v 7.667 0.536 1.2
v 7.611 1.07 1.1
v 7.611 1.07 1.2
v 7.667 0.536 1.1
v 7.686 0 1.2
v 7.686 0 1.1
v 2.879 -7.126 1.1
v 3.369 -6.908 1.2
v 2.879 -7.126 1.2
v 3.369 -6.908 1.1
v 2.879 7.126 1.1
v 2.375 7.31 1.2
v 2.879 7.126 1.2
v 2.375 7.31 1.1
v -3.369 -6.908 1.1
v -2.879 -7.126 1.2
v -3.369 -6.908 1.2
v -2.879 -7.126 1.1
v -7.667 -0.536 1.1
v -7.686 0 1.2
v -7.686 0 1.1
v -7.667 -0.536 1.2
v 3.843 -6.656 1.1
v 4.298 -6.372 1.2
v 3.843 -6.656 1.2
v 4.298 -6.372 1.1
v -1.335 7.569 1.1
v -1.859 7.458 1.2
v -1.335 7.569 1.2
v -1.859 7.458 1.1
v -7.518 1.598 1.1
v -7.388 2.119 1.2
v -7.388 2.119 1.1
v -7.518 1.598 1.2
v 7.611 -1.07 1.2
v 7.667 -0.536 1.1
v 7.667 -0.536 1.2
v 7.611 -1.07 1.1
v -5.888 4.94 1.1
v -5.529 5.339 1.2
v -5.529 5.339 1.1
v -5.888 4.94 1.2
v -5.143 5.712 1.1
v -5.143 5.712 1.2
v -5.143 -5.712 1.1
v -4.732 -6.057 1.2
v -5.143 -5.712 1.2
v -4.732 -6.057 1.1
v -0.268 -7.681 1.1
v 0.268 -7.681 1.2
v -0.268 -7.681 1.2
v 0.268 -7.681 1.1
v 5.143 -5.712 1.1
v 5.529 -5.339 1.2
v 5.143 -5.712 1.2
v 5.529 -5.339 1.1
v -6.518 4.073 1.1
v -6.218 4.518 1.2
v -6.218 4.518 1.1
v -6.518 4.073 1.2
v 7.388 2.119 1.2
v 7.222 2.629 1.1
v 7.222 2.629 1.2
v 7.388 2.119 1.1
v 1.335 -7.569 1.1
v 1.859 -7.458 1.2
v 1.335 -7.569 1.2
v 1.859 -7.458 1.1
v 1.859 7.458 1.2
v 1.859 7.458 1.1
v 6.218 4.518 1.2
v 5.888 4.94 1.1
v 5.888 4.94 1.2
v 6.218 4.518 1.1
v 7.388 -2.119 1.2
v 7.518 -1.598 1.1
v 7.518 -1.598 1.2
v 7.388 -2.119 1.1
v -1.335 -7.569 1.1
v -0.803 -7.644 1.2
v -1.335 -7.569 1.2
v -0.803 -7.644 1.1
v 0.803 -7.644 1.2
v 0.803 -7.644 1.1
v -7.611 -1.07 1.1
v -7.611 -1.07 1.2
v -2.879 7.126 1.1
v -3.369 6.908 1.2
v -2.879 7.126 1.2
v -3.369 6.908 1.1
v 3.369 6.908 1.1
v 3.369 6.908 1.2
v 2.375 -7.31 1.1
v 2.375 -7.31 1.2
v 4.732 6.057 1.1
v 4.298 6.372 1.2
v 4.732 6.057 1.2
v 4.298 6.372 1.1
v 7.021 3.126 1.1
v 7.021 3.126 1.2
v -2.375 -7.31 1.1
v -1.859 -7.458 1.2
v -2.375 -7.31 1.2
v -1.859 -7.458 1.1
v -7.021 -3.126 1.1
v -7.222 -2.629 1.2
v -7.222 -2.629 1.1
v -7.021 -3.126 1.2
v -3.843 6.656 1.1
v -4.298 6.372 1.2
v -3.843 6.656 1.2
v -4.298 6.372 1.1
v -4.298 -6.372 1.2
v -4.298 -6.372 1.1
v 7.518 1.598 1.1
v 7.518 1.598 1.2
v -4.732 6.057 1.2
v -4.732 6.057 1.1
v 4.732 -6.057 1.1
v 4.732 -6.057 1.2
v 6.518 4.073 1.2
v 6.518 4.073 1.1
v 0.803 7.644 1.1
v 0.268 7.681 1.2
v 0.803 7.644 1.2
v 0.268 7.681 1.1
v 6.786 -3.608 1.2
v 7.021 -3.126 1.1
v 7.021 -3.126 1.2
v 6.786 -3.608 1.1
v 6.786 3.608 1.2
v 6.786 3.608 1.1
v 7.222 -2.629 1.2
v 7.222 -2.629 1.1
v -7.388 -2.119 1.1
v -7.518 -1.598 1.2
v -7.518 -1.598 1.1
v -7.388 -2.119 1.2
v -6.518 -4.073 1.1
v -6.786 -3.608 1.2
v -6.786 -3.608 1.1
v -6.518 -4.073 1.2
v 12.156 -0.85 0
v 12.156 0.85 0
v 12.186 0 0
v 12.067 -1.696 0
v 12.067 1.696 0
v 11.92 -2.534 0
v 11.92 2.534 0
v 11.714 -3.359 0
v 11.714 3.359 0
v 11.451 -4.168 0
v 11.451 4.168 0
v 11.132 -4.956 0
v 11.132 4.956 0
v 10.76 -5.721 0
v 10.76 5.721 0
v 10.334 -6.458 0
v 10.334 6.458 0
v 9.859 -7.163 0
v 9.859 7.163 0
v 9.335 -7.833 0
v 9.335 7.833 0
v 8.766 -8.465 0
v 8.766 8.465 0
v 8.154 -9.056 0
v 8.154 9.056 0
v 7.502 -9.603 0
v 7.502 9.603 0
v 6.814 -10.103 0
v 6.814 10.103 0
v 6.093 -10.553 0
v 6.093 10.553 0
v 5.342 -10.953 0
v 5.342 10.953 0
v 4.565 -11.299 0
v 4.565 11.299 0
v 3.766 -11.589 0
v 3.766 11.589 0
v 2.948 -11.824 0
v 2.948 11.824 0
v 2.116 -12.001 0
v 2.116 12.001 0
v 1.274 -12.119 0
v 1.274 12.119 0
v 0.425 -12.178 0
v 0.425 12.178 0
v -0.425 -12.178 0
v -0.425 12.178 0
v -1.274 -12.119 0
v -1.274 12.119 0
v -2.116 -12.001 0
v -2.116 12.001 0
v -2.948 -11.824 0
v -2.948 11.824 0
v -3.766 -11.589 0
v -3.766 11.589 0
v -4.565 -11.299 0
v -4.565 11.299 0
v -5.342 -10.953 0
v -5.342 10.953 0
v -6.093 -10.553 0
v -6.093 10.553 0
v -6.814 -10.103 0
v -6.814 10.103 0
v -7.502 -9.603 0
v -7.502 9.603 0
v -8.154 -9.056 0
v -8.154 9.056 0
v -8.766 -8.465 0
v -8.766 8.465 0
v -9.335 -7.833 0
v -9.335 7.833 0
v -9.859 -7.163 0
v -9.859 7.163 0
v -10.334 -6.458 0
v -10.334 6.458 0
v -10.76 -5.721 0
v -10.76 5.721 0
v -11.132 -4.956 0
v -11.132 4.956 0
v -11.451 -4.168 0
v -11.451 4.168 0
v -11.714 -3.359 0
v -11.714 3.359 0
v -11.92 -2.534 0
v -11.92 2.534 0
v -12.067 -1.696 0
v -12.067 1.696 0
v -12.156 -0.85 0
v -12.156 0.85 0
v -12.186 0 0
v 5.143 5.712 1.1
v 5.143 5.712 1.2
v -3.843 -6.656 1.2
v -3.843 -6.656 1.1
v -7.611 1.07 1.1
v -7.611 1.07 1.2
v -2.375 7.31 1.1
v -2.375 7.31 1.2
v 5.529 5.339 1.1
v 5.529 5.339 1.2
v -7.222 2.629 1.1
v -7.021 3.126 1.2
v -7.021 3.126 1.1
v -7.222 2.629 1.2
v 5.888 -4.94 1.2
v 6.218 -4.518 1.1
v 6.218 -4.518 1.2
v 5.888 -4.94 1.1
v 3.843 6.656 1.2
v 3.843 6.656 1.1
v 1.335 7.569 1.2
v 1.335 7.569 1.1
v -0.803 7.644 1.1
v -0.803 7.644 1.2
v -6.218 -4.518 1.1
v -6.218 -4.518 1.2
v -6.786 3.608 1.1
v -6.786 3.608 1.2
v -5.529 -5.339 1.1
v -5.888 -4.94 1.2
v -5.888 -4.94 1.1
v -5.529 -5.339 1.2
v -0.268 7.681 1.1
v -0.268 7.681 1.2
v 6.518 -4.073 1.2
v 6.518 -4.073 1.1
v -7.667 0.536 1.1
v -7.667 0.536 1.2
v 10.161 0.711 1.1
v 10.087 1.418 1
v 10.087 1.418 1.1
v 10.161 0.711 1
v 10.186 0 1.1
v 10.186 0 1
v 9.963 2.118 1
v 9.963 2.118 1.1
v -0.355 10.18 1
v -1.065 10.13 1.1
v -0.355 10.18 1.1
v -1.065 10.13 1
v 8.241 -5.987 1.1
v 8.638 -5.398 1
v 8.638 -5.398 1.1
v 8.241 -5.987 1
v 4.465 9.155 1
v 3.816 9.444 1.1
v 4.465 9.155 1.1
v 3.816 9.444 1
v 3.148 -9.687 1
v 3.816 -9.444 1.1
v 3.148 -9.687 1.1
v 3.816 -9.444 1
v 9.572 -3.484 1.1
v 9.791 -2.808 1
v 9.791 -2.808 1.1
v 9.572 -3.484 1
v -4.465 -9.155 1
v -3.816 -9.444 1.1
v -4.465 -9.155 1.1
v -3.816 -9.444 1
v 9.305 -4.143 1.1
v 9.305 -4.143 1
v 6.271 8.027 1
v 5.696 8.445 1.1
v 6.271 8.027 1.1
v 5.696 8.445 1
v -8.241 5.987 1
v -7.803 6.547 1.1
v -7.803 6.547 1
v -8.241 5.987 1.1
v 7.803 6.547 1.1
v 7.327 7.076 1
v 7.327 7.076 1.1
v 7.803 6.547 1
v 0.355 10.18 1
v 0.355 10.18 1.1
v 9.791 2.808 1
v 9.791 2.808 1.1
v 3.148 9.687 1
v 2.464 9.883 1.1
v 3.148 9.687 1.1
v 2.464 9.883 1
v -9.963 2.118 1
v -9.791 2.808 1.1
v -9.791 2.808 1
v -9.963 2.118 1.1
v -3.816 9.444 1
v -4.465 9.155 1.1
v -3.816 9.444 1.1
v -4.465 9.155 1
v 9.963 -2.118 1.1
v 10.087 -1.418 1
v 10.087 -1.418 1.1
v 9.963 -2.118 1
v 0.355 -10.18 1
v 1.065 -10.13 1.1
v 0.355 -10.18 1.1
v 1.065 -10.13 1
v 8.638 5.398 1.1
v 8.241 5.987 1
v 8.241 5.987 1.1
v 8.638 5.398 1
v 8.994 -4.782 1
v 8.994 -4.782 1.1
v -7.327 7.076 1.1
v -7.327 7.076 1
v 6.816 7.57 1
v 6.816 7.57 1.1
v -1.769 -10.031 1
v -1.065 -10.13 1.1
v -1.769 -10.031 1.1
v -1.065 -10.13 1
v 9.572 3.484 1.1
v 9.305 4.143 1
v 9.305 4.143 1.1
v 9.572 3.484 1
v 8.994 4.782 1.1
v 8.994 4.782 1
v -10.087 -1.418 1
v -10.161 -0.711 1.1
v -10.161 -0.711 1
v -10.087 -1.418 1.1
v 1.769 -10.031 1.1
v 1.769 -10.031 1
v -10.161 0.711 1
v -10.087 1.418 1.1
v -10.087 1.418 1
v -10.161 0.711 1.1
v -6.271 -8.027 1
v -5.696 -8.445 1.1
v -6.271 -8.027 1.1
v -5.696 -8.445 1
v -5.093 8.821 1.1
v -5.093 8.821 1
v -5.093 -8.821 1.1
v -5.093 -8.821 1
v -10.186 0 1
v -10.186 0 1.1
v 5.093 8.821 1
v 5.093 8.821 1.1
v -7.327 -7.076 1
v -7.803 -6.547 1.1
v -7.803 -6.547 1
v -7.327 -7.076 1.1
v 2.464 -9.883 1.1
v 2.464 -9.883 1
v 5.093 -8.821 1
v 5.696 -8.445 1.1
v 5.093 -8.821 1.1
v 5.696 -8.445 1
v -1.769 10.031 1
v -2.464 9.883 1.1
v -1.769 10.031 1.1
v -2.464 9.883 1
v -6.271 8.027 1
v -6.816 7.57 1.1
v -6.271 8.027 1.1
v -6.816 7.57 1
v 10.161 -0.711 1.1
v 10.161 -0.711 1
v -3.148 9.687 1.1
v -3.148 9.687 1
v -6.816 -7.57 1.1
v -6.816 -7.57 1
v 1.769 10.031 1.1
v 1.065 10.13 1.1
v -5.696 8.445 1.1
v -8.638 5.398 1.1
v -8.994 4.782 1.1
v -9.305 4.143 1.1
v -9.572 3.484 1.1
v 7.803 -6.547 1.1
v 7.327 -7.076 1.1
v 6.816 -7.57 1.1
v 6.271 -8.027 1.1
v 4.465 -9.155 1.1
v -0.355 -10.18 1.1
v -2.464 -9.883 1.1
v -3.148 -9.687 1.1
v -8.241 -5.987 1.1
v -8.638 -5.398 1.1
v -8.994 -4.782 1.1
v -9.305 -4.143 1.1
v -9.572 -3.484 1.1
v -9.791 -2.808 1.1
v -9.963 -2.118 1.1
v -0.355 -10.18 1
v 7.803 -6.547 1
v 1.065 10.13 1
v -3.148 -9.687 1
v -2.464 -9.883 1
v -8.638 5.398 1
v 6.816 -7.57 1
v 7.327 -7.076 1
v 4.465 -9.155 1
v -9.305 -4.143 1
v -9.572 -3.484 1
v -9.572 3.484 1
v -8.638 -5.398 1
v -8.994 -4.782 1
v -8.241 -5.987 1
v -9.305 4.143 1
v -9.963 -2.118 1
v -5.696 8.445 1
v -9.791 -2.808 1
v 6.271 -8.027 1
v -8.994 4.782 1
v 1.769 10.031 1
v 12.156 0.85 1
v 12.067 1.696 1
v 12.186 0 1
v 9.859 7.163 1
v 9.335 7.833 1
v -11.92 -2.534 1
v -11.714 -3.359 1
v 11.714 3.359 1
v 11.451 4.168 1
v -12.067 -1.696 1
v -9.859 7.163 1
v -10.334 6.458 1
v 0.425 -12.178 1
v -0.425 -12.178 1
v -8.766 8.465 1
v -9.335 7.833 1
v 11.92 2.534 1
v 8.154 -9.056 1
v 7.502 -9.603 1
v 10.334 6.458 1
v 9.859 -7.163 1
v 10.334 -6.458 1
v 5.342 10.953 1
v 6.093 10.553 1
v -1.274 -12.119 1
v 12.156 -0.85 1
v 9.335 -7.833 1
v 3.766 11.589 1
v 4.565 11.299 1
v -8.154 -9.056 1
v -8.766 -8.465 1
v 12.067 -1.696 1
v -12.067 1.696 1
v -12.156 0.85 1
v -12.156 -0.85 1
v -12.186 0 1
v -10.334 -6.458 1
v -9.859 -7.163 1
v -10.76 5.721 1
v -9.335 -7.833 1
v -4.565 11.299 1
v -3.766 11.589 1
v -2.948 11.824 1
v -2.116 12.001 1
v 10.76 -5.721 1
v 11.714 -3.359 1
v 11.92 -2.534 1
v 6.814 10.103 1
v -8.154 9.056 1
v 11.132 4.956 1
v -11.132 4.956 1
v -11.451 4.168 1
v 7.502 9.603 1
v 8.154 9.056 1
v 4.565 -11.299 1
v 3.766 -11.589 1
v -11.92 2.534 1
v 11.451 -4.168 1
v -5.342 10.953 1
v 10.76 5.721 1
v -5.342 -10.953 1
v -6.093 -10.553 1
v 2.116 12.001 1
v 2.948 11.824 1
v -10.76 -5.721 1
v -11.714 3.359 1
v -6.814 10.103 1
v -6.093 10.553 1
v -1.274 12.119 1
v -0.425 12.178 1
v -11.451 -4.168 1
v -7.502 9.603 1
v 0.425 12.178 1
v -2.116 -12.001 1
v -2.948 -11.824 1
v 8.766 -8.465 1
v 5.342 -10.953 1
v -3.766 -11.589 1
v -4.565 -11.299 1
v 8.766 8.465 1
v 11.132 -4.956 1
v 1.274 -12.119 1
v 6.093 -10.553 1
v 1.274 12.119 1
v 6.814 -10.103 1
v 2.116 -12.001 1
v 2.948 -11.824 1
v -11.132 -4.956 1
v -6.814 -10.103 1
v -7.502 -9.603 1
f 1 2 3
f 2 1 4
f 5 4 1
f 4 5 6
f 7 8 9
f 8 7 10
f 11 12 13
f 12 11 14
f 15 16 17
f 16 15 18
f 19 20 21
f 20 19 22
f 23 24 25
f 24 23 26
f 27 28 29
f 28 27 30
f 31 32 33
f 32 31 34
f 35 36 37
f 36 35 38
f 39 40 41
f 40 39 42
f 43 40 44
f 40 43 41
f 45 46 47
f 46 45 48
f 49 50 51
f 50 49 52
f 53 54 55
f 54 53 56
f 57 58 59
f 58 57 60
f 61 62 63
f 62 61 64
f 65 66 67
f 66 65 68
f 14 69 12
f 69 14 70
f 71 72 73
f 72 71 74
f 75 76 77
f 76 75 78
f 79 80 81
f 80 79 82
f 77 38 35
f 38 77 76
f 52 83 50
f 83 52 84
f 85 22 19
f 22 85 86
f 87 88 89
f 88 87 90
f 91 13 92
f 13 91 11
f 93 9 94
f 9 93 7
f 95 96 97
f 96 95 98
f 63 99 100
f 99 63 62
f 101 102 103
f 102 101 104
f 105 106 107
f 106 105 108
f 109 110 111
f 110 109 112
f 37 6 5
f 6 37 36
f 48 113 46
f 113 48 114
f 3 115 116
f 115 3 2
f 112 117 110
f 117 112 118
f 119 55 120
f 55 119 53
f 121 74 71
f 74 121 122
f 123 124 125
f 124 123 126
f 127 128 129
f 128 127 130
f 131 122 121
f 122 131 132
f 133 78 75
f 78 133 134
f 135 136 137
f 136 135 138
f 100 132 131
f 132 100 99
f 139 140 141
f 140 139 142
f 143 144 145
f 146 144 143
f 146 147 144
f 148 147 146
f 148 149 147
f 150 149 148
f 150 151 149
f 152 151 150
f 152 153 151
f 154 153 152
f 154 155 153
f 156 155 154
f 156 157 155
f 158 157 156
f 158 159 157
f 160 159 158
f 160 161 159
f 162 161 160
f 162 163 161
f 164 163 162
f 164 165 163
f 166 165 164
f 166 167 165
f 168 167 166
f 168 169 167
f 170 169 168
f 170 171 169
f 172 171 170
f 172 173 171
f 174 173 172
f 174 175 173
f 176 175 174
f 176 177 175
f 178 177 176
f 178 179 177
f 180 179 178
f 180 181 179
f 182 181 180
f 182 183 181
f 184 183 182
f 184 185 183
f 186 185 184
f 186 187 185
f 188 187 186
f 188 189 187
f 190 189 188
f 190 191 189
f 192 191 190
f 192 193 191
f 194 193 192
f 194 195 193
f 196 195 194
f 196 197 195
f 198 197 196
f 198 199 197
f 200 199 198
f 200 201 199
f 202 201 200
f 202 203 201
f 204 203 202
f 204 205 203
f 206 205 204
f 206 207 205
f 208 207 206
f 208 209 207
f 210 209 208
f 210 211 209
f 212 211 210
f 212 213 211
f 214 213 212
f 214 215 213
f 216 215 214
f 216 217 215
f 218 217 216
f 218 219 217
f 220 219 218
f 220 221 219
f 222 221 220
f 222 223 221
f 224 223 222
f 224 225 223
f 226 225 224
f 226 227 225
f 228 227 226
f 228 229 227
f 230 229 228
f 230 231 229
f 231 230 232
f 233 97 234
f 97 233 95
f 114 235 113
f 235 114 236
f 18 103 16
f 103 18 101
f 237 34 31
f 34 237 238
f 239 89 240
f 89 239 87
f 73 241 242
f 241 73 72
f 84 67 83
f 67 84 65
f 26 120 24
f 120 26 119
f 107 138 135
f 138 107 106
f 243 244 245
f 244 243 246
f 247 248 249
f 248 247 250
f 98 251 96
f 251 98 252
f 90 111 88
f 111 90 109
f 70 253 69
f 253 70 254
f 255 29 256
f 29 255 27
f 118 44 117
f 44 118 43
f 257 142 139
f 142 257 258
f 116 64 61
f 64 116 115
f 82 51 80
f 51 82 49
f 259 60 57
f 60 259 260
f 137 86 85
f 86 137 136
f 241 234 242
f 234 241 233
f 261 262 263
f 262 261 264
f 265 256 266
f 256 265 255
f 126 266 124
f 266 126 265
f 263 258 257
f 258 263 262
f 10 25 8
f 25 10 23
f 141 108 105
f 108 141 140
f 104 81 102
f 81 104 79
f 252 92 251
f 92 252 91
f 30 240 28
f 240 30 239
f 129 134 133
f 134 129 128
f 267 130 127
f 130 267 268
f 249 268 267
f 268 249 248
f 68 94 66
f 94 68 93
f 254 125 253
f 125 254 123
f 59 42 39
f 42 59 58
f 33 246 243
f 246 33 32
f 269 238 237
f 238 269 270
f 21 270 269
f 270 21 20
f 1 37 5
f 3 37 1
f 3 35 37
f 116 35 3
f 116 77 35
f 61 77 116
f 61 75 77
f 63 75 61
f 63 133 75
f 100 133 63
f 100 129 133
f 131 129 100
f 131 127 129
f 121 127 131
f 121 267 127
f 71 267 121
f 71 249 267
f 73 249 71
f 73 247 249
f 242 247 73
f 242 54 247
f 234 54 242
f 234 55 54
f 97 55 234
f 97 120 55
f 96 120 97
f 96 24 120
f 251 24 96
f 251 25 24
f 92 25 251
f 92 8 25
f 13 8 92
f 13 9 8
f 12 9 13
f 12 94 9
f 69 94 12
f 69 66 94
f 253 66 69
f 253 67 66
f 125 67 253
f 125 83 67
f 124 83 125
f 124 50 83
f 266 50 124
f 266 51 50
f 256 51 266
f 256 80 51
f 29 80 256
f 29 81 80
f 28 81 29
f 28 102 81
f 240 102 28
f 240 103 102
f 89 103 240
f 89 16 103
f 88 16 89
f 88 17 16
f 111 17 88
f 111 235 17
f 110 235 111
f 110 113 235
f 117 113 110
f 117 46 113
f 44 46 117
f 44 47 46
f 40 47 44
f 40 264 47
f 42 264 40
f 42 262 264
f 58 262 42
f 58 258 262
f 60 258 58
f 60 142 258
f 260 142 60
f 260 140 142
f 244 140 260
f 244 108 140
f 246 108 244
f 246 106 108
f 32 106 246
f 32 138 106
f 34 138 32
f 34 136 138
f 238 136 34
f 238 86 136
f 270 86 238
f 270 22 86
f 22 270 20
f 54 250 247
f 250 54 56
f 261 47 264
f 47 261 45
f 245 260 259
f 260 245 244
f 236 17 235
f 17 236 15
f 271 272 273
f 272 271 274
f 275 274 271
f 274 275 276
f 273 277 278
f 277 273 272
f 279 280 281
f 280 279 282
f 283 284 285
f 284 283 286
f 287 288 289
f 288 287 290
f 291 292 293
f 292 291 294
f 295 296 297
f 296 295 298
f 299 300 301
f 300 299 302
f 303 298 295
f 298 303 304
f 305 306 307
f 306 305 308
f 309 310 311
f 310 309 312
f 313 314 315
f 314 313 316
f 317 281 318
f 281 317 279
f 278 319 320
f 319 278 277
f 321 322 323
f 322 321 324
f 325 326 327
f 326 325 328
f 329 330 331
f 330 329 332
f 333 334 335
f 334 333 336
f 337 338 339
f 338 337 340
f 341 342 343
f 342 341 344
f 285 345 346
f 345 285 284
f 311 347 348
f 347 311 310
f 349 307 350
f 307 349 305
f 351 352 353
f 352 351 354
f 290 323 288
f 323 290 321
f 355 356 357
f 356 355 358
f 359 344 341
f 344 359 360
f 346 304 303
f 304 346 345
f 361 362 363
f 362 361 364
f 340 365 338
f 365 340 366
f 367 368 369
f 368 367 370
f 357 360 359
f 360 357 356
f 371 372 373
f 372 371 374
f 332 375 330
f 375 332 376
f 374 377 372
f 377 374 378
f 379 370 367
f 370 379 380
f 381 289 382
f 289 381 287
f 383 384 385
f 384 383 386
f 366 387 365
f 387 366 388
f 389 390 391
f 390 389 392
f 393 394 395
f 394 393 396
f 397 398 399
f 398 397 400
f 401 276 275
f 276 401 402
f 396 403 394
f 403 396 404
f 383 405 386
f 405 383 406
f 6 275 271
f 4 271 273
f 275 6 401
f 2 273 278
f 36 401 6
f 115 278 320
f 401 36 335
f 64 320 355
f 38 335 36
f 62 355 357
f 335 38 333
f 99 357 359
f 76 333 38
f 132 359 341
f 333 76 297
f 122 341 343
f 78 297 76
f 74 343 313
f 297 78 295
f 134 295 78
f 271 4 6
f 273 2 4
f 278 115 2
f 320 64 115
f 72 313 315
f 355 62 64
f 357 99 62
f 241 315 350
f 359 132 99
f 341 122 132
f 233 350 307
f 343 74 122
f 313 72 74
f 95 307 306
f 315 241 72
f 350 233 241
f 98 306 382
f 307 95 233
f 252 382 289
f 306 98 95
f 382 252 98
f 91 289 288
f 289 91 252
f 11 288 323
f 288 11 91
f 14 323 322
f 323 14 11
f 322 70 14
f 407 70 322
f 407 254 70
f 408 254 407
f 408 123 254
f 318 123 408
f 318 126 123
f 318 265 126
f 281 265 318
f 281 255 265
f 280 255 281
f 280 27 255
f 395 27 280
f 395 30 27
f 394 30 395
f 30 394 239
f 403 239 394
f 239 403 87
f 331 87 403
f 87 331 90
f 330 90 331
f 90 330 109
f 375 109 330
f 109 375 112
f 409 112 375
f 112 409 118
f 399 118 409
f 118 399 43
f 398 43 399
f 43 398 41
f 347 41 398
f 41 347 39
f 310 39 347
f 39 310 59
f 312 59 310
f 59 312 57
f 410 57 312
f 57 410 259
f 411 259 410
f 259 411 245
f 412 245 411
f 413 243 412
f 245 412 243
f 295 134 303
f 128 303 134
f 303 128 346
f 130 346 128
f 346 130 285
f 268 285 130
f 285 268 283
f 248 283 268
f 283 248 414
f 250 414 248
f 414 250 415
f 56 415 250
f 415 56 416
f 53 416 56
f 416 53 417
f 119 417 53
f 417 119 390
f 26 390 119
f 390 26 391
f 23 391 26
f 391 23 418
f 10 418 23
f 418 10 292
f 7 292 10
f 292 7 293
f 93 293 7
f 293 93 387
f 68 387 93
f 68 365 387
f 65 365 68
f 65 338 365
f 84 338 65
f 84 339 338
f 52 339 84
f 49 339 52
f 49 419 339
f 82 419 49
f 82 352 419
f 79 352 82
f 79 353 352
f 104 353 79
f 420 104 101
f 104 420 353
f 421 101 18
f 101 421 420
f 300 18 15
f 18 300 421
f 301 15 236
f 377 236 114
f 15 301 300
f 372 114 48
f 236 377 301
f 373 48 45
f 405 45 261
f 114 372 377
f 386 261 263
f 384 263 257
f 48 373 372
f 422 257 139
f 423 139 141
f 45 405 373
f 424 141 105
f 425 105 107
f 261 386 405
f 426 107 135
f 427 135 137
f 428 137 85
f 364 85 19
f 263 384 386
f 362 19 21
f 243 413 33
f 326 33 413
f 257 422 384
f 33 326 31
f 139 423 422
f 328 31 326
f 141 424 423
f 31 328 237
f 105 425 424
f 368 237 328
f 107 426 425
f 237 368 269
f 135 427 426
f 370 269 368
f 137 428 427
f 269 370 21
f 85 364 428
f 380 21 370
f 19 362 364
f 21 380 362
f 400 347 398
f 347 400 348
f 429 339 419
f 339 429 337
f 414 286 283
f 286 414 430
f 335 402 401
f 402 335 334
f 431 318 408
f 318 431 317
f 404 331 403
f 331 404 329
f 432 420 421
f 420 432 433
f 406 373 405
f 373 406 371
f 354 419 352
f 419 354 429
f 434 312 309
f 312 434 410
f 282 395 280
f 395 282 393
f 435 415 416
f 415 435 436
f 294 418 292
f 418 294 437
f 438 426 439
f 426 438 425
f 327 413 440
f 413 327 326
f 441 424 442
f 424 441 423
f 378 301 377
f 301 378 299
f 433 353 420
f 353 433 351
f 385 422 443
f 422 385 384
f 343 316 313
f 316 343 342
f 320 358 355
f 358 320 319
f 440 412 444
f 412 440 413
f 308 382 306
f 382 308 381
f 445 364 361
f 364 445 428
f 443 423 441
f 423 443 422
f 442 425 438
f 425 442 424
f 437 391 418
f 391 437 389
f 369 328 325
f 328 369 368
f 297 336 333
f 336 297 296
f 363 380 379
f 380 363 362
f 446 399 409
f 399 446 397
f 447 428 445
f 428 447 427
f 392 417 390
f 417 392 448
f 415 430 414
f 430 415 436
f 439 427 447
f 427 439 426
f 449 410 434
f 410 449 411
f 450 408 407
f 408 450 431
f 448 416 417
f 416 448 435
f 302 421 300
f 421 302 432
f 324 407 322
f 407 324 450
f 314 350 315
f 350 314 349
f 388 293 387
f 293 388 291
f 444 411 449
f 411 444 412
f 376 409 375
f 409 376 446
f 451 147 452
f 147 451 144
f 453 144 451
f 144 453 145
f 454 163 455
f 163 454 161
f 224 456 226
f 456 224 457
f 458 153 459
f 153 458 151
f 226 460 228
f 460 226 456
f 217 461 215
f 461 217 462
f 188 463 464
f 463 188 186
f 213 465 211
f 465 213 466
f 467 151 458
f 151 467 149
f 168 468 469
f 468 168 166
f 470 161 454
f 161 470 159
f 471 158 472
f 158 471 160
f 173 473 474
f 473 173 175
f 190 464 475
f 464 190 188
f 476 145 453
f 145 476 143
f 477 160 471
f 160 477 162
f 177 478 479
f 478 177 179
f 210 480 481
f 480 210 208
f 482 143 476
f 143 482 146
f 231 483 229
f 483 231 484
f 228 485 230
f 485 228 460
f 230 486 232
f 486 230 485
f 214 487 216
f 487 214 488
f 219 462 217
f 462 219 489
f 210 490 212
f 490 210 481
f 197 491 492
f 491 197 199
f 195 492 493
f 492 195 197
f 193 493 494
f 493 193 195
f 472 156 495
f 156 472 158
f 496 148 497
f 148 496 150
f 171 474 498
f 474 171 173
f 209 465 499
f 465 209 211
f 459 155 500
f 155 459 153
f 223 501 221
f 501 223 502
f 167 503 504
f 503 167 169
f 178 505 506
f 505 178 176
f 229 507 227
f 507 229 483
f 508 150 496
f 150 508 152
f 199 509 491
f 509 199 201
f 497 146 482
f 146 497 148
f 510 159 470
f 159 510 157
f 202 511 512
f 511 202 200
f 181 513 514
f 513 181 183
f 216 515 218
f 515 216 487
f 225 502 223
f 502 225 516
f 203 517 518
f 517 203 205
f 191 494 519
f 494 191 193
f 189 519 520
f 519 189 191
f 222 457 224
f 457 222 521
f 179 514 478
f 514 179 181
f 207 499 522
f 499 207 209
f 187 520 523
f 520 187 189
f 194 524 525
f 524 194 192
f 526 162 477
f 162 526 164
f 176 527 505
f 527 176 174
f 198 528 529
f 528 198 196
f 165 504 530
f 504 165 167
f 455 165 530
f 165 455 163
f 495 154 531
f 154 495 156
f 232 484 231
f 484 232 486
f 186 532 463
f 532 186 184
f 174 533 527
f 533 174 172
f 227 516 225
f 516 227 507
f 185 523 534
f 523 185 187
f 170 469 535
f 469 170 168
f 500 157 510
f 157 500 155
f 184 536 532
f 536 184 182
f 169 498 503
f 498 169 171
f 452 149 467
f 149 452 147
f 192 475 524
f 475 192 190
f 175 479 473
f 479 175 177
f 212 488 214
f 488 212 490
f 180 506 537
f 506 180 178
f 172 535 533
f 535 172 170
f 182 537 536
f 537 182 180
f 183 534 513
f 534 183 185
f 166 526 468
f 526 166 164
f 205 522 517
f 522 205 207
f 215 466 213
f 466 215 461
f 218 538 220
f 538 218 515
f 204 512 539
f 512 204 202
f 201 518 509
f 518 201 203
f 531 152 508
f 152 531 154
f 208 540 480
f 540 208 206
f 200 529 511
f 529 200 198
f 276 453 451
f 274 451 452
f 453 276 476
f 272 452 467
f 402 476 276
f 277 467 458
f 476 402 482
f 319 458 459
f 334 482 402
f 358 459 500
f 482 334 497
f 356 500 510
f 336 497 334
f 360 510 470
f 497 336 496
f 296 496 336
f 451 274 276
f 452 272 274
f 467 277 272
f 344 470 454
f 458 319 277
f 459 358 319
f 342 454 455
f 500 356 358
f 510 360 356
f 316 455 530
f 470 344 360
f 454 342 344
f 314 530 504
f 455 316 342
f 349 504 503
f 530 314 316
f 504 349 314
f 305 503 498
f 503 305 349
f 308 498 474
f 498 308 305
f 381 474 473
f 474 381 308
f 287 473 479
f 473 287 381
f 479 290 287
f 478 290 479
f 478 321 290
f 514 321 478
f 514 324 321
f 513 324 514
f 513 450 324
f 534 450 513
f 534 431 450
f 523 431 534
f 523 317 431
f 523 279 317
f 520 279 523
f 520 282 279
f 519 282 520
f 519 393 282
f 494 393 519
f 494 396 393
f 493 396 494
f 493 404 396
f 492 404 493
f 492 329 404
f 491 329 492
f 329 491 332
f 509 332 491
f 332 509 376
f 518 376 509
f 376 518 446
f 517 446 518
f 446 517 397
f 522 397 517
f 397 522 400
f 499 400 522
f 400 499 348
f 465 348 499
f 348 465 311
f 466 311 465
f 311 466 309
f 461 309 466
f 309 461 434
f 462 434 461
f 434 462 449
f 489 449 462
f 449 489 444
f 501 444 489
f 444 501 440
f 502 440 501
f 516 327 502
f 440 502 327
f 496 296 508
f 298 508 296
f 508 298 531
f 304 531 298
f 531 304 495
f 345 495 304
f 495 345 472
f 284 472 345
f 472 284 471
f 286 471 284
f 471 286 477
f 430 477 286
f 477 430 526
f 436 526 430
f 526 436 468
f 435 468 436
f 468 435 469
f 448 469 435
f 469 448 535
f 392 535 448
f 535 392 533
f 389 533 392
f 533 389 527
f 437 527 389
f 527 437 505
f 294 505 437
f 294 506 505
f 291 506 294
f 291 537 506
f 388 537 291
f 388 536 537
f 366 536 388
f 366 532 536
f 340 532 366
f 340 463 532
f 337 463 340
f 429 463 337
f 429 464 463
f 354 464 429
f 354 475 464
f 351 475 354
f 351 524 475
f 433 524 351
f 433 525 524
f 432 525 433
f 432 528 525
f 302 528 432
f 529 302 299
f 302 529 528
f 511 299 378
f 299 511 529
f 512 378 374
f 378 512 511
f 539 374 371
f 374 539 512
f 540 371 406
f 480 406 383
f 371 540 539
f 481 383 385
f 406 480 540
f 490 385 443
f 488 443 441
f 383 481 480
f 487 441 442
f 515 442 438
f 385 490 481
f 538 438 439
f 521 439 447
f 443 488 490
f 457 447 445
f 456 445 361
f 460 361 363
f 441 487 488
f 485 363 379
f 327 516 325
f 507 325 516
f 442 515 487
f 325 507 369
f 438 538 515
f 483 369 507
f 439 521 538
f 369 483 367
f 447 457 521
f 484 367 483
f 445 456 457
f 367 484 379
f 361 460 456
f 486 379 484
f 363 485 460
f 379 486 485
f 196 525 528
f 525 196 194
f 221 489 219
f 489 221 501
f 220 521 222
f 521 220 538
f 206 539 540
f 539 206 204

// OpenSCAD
$fn = 90;

union() {
	color(c = [0, 0, 0]) {
		cylinder(d = 15.3718327158, h = 1.2000000000);
	}
	color(c = [1, 0, 1]) {
		cylinder(d = 20.3718327158, h = 1.1000000000);
	}
	color(c = [0, 1, 0]) {
		cylinder(d = 24.3718327158, h = 1.0000000000);
	}
}
